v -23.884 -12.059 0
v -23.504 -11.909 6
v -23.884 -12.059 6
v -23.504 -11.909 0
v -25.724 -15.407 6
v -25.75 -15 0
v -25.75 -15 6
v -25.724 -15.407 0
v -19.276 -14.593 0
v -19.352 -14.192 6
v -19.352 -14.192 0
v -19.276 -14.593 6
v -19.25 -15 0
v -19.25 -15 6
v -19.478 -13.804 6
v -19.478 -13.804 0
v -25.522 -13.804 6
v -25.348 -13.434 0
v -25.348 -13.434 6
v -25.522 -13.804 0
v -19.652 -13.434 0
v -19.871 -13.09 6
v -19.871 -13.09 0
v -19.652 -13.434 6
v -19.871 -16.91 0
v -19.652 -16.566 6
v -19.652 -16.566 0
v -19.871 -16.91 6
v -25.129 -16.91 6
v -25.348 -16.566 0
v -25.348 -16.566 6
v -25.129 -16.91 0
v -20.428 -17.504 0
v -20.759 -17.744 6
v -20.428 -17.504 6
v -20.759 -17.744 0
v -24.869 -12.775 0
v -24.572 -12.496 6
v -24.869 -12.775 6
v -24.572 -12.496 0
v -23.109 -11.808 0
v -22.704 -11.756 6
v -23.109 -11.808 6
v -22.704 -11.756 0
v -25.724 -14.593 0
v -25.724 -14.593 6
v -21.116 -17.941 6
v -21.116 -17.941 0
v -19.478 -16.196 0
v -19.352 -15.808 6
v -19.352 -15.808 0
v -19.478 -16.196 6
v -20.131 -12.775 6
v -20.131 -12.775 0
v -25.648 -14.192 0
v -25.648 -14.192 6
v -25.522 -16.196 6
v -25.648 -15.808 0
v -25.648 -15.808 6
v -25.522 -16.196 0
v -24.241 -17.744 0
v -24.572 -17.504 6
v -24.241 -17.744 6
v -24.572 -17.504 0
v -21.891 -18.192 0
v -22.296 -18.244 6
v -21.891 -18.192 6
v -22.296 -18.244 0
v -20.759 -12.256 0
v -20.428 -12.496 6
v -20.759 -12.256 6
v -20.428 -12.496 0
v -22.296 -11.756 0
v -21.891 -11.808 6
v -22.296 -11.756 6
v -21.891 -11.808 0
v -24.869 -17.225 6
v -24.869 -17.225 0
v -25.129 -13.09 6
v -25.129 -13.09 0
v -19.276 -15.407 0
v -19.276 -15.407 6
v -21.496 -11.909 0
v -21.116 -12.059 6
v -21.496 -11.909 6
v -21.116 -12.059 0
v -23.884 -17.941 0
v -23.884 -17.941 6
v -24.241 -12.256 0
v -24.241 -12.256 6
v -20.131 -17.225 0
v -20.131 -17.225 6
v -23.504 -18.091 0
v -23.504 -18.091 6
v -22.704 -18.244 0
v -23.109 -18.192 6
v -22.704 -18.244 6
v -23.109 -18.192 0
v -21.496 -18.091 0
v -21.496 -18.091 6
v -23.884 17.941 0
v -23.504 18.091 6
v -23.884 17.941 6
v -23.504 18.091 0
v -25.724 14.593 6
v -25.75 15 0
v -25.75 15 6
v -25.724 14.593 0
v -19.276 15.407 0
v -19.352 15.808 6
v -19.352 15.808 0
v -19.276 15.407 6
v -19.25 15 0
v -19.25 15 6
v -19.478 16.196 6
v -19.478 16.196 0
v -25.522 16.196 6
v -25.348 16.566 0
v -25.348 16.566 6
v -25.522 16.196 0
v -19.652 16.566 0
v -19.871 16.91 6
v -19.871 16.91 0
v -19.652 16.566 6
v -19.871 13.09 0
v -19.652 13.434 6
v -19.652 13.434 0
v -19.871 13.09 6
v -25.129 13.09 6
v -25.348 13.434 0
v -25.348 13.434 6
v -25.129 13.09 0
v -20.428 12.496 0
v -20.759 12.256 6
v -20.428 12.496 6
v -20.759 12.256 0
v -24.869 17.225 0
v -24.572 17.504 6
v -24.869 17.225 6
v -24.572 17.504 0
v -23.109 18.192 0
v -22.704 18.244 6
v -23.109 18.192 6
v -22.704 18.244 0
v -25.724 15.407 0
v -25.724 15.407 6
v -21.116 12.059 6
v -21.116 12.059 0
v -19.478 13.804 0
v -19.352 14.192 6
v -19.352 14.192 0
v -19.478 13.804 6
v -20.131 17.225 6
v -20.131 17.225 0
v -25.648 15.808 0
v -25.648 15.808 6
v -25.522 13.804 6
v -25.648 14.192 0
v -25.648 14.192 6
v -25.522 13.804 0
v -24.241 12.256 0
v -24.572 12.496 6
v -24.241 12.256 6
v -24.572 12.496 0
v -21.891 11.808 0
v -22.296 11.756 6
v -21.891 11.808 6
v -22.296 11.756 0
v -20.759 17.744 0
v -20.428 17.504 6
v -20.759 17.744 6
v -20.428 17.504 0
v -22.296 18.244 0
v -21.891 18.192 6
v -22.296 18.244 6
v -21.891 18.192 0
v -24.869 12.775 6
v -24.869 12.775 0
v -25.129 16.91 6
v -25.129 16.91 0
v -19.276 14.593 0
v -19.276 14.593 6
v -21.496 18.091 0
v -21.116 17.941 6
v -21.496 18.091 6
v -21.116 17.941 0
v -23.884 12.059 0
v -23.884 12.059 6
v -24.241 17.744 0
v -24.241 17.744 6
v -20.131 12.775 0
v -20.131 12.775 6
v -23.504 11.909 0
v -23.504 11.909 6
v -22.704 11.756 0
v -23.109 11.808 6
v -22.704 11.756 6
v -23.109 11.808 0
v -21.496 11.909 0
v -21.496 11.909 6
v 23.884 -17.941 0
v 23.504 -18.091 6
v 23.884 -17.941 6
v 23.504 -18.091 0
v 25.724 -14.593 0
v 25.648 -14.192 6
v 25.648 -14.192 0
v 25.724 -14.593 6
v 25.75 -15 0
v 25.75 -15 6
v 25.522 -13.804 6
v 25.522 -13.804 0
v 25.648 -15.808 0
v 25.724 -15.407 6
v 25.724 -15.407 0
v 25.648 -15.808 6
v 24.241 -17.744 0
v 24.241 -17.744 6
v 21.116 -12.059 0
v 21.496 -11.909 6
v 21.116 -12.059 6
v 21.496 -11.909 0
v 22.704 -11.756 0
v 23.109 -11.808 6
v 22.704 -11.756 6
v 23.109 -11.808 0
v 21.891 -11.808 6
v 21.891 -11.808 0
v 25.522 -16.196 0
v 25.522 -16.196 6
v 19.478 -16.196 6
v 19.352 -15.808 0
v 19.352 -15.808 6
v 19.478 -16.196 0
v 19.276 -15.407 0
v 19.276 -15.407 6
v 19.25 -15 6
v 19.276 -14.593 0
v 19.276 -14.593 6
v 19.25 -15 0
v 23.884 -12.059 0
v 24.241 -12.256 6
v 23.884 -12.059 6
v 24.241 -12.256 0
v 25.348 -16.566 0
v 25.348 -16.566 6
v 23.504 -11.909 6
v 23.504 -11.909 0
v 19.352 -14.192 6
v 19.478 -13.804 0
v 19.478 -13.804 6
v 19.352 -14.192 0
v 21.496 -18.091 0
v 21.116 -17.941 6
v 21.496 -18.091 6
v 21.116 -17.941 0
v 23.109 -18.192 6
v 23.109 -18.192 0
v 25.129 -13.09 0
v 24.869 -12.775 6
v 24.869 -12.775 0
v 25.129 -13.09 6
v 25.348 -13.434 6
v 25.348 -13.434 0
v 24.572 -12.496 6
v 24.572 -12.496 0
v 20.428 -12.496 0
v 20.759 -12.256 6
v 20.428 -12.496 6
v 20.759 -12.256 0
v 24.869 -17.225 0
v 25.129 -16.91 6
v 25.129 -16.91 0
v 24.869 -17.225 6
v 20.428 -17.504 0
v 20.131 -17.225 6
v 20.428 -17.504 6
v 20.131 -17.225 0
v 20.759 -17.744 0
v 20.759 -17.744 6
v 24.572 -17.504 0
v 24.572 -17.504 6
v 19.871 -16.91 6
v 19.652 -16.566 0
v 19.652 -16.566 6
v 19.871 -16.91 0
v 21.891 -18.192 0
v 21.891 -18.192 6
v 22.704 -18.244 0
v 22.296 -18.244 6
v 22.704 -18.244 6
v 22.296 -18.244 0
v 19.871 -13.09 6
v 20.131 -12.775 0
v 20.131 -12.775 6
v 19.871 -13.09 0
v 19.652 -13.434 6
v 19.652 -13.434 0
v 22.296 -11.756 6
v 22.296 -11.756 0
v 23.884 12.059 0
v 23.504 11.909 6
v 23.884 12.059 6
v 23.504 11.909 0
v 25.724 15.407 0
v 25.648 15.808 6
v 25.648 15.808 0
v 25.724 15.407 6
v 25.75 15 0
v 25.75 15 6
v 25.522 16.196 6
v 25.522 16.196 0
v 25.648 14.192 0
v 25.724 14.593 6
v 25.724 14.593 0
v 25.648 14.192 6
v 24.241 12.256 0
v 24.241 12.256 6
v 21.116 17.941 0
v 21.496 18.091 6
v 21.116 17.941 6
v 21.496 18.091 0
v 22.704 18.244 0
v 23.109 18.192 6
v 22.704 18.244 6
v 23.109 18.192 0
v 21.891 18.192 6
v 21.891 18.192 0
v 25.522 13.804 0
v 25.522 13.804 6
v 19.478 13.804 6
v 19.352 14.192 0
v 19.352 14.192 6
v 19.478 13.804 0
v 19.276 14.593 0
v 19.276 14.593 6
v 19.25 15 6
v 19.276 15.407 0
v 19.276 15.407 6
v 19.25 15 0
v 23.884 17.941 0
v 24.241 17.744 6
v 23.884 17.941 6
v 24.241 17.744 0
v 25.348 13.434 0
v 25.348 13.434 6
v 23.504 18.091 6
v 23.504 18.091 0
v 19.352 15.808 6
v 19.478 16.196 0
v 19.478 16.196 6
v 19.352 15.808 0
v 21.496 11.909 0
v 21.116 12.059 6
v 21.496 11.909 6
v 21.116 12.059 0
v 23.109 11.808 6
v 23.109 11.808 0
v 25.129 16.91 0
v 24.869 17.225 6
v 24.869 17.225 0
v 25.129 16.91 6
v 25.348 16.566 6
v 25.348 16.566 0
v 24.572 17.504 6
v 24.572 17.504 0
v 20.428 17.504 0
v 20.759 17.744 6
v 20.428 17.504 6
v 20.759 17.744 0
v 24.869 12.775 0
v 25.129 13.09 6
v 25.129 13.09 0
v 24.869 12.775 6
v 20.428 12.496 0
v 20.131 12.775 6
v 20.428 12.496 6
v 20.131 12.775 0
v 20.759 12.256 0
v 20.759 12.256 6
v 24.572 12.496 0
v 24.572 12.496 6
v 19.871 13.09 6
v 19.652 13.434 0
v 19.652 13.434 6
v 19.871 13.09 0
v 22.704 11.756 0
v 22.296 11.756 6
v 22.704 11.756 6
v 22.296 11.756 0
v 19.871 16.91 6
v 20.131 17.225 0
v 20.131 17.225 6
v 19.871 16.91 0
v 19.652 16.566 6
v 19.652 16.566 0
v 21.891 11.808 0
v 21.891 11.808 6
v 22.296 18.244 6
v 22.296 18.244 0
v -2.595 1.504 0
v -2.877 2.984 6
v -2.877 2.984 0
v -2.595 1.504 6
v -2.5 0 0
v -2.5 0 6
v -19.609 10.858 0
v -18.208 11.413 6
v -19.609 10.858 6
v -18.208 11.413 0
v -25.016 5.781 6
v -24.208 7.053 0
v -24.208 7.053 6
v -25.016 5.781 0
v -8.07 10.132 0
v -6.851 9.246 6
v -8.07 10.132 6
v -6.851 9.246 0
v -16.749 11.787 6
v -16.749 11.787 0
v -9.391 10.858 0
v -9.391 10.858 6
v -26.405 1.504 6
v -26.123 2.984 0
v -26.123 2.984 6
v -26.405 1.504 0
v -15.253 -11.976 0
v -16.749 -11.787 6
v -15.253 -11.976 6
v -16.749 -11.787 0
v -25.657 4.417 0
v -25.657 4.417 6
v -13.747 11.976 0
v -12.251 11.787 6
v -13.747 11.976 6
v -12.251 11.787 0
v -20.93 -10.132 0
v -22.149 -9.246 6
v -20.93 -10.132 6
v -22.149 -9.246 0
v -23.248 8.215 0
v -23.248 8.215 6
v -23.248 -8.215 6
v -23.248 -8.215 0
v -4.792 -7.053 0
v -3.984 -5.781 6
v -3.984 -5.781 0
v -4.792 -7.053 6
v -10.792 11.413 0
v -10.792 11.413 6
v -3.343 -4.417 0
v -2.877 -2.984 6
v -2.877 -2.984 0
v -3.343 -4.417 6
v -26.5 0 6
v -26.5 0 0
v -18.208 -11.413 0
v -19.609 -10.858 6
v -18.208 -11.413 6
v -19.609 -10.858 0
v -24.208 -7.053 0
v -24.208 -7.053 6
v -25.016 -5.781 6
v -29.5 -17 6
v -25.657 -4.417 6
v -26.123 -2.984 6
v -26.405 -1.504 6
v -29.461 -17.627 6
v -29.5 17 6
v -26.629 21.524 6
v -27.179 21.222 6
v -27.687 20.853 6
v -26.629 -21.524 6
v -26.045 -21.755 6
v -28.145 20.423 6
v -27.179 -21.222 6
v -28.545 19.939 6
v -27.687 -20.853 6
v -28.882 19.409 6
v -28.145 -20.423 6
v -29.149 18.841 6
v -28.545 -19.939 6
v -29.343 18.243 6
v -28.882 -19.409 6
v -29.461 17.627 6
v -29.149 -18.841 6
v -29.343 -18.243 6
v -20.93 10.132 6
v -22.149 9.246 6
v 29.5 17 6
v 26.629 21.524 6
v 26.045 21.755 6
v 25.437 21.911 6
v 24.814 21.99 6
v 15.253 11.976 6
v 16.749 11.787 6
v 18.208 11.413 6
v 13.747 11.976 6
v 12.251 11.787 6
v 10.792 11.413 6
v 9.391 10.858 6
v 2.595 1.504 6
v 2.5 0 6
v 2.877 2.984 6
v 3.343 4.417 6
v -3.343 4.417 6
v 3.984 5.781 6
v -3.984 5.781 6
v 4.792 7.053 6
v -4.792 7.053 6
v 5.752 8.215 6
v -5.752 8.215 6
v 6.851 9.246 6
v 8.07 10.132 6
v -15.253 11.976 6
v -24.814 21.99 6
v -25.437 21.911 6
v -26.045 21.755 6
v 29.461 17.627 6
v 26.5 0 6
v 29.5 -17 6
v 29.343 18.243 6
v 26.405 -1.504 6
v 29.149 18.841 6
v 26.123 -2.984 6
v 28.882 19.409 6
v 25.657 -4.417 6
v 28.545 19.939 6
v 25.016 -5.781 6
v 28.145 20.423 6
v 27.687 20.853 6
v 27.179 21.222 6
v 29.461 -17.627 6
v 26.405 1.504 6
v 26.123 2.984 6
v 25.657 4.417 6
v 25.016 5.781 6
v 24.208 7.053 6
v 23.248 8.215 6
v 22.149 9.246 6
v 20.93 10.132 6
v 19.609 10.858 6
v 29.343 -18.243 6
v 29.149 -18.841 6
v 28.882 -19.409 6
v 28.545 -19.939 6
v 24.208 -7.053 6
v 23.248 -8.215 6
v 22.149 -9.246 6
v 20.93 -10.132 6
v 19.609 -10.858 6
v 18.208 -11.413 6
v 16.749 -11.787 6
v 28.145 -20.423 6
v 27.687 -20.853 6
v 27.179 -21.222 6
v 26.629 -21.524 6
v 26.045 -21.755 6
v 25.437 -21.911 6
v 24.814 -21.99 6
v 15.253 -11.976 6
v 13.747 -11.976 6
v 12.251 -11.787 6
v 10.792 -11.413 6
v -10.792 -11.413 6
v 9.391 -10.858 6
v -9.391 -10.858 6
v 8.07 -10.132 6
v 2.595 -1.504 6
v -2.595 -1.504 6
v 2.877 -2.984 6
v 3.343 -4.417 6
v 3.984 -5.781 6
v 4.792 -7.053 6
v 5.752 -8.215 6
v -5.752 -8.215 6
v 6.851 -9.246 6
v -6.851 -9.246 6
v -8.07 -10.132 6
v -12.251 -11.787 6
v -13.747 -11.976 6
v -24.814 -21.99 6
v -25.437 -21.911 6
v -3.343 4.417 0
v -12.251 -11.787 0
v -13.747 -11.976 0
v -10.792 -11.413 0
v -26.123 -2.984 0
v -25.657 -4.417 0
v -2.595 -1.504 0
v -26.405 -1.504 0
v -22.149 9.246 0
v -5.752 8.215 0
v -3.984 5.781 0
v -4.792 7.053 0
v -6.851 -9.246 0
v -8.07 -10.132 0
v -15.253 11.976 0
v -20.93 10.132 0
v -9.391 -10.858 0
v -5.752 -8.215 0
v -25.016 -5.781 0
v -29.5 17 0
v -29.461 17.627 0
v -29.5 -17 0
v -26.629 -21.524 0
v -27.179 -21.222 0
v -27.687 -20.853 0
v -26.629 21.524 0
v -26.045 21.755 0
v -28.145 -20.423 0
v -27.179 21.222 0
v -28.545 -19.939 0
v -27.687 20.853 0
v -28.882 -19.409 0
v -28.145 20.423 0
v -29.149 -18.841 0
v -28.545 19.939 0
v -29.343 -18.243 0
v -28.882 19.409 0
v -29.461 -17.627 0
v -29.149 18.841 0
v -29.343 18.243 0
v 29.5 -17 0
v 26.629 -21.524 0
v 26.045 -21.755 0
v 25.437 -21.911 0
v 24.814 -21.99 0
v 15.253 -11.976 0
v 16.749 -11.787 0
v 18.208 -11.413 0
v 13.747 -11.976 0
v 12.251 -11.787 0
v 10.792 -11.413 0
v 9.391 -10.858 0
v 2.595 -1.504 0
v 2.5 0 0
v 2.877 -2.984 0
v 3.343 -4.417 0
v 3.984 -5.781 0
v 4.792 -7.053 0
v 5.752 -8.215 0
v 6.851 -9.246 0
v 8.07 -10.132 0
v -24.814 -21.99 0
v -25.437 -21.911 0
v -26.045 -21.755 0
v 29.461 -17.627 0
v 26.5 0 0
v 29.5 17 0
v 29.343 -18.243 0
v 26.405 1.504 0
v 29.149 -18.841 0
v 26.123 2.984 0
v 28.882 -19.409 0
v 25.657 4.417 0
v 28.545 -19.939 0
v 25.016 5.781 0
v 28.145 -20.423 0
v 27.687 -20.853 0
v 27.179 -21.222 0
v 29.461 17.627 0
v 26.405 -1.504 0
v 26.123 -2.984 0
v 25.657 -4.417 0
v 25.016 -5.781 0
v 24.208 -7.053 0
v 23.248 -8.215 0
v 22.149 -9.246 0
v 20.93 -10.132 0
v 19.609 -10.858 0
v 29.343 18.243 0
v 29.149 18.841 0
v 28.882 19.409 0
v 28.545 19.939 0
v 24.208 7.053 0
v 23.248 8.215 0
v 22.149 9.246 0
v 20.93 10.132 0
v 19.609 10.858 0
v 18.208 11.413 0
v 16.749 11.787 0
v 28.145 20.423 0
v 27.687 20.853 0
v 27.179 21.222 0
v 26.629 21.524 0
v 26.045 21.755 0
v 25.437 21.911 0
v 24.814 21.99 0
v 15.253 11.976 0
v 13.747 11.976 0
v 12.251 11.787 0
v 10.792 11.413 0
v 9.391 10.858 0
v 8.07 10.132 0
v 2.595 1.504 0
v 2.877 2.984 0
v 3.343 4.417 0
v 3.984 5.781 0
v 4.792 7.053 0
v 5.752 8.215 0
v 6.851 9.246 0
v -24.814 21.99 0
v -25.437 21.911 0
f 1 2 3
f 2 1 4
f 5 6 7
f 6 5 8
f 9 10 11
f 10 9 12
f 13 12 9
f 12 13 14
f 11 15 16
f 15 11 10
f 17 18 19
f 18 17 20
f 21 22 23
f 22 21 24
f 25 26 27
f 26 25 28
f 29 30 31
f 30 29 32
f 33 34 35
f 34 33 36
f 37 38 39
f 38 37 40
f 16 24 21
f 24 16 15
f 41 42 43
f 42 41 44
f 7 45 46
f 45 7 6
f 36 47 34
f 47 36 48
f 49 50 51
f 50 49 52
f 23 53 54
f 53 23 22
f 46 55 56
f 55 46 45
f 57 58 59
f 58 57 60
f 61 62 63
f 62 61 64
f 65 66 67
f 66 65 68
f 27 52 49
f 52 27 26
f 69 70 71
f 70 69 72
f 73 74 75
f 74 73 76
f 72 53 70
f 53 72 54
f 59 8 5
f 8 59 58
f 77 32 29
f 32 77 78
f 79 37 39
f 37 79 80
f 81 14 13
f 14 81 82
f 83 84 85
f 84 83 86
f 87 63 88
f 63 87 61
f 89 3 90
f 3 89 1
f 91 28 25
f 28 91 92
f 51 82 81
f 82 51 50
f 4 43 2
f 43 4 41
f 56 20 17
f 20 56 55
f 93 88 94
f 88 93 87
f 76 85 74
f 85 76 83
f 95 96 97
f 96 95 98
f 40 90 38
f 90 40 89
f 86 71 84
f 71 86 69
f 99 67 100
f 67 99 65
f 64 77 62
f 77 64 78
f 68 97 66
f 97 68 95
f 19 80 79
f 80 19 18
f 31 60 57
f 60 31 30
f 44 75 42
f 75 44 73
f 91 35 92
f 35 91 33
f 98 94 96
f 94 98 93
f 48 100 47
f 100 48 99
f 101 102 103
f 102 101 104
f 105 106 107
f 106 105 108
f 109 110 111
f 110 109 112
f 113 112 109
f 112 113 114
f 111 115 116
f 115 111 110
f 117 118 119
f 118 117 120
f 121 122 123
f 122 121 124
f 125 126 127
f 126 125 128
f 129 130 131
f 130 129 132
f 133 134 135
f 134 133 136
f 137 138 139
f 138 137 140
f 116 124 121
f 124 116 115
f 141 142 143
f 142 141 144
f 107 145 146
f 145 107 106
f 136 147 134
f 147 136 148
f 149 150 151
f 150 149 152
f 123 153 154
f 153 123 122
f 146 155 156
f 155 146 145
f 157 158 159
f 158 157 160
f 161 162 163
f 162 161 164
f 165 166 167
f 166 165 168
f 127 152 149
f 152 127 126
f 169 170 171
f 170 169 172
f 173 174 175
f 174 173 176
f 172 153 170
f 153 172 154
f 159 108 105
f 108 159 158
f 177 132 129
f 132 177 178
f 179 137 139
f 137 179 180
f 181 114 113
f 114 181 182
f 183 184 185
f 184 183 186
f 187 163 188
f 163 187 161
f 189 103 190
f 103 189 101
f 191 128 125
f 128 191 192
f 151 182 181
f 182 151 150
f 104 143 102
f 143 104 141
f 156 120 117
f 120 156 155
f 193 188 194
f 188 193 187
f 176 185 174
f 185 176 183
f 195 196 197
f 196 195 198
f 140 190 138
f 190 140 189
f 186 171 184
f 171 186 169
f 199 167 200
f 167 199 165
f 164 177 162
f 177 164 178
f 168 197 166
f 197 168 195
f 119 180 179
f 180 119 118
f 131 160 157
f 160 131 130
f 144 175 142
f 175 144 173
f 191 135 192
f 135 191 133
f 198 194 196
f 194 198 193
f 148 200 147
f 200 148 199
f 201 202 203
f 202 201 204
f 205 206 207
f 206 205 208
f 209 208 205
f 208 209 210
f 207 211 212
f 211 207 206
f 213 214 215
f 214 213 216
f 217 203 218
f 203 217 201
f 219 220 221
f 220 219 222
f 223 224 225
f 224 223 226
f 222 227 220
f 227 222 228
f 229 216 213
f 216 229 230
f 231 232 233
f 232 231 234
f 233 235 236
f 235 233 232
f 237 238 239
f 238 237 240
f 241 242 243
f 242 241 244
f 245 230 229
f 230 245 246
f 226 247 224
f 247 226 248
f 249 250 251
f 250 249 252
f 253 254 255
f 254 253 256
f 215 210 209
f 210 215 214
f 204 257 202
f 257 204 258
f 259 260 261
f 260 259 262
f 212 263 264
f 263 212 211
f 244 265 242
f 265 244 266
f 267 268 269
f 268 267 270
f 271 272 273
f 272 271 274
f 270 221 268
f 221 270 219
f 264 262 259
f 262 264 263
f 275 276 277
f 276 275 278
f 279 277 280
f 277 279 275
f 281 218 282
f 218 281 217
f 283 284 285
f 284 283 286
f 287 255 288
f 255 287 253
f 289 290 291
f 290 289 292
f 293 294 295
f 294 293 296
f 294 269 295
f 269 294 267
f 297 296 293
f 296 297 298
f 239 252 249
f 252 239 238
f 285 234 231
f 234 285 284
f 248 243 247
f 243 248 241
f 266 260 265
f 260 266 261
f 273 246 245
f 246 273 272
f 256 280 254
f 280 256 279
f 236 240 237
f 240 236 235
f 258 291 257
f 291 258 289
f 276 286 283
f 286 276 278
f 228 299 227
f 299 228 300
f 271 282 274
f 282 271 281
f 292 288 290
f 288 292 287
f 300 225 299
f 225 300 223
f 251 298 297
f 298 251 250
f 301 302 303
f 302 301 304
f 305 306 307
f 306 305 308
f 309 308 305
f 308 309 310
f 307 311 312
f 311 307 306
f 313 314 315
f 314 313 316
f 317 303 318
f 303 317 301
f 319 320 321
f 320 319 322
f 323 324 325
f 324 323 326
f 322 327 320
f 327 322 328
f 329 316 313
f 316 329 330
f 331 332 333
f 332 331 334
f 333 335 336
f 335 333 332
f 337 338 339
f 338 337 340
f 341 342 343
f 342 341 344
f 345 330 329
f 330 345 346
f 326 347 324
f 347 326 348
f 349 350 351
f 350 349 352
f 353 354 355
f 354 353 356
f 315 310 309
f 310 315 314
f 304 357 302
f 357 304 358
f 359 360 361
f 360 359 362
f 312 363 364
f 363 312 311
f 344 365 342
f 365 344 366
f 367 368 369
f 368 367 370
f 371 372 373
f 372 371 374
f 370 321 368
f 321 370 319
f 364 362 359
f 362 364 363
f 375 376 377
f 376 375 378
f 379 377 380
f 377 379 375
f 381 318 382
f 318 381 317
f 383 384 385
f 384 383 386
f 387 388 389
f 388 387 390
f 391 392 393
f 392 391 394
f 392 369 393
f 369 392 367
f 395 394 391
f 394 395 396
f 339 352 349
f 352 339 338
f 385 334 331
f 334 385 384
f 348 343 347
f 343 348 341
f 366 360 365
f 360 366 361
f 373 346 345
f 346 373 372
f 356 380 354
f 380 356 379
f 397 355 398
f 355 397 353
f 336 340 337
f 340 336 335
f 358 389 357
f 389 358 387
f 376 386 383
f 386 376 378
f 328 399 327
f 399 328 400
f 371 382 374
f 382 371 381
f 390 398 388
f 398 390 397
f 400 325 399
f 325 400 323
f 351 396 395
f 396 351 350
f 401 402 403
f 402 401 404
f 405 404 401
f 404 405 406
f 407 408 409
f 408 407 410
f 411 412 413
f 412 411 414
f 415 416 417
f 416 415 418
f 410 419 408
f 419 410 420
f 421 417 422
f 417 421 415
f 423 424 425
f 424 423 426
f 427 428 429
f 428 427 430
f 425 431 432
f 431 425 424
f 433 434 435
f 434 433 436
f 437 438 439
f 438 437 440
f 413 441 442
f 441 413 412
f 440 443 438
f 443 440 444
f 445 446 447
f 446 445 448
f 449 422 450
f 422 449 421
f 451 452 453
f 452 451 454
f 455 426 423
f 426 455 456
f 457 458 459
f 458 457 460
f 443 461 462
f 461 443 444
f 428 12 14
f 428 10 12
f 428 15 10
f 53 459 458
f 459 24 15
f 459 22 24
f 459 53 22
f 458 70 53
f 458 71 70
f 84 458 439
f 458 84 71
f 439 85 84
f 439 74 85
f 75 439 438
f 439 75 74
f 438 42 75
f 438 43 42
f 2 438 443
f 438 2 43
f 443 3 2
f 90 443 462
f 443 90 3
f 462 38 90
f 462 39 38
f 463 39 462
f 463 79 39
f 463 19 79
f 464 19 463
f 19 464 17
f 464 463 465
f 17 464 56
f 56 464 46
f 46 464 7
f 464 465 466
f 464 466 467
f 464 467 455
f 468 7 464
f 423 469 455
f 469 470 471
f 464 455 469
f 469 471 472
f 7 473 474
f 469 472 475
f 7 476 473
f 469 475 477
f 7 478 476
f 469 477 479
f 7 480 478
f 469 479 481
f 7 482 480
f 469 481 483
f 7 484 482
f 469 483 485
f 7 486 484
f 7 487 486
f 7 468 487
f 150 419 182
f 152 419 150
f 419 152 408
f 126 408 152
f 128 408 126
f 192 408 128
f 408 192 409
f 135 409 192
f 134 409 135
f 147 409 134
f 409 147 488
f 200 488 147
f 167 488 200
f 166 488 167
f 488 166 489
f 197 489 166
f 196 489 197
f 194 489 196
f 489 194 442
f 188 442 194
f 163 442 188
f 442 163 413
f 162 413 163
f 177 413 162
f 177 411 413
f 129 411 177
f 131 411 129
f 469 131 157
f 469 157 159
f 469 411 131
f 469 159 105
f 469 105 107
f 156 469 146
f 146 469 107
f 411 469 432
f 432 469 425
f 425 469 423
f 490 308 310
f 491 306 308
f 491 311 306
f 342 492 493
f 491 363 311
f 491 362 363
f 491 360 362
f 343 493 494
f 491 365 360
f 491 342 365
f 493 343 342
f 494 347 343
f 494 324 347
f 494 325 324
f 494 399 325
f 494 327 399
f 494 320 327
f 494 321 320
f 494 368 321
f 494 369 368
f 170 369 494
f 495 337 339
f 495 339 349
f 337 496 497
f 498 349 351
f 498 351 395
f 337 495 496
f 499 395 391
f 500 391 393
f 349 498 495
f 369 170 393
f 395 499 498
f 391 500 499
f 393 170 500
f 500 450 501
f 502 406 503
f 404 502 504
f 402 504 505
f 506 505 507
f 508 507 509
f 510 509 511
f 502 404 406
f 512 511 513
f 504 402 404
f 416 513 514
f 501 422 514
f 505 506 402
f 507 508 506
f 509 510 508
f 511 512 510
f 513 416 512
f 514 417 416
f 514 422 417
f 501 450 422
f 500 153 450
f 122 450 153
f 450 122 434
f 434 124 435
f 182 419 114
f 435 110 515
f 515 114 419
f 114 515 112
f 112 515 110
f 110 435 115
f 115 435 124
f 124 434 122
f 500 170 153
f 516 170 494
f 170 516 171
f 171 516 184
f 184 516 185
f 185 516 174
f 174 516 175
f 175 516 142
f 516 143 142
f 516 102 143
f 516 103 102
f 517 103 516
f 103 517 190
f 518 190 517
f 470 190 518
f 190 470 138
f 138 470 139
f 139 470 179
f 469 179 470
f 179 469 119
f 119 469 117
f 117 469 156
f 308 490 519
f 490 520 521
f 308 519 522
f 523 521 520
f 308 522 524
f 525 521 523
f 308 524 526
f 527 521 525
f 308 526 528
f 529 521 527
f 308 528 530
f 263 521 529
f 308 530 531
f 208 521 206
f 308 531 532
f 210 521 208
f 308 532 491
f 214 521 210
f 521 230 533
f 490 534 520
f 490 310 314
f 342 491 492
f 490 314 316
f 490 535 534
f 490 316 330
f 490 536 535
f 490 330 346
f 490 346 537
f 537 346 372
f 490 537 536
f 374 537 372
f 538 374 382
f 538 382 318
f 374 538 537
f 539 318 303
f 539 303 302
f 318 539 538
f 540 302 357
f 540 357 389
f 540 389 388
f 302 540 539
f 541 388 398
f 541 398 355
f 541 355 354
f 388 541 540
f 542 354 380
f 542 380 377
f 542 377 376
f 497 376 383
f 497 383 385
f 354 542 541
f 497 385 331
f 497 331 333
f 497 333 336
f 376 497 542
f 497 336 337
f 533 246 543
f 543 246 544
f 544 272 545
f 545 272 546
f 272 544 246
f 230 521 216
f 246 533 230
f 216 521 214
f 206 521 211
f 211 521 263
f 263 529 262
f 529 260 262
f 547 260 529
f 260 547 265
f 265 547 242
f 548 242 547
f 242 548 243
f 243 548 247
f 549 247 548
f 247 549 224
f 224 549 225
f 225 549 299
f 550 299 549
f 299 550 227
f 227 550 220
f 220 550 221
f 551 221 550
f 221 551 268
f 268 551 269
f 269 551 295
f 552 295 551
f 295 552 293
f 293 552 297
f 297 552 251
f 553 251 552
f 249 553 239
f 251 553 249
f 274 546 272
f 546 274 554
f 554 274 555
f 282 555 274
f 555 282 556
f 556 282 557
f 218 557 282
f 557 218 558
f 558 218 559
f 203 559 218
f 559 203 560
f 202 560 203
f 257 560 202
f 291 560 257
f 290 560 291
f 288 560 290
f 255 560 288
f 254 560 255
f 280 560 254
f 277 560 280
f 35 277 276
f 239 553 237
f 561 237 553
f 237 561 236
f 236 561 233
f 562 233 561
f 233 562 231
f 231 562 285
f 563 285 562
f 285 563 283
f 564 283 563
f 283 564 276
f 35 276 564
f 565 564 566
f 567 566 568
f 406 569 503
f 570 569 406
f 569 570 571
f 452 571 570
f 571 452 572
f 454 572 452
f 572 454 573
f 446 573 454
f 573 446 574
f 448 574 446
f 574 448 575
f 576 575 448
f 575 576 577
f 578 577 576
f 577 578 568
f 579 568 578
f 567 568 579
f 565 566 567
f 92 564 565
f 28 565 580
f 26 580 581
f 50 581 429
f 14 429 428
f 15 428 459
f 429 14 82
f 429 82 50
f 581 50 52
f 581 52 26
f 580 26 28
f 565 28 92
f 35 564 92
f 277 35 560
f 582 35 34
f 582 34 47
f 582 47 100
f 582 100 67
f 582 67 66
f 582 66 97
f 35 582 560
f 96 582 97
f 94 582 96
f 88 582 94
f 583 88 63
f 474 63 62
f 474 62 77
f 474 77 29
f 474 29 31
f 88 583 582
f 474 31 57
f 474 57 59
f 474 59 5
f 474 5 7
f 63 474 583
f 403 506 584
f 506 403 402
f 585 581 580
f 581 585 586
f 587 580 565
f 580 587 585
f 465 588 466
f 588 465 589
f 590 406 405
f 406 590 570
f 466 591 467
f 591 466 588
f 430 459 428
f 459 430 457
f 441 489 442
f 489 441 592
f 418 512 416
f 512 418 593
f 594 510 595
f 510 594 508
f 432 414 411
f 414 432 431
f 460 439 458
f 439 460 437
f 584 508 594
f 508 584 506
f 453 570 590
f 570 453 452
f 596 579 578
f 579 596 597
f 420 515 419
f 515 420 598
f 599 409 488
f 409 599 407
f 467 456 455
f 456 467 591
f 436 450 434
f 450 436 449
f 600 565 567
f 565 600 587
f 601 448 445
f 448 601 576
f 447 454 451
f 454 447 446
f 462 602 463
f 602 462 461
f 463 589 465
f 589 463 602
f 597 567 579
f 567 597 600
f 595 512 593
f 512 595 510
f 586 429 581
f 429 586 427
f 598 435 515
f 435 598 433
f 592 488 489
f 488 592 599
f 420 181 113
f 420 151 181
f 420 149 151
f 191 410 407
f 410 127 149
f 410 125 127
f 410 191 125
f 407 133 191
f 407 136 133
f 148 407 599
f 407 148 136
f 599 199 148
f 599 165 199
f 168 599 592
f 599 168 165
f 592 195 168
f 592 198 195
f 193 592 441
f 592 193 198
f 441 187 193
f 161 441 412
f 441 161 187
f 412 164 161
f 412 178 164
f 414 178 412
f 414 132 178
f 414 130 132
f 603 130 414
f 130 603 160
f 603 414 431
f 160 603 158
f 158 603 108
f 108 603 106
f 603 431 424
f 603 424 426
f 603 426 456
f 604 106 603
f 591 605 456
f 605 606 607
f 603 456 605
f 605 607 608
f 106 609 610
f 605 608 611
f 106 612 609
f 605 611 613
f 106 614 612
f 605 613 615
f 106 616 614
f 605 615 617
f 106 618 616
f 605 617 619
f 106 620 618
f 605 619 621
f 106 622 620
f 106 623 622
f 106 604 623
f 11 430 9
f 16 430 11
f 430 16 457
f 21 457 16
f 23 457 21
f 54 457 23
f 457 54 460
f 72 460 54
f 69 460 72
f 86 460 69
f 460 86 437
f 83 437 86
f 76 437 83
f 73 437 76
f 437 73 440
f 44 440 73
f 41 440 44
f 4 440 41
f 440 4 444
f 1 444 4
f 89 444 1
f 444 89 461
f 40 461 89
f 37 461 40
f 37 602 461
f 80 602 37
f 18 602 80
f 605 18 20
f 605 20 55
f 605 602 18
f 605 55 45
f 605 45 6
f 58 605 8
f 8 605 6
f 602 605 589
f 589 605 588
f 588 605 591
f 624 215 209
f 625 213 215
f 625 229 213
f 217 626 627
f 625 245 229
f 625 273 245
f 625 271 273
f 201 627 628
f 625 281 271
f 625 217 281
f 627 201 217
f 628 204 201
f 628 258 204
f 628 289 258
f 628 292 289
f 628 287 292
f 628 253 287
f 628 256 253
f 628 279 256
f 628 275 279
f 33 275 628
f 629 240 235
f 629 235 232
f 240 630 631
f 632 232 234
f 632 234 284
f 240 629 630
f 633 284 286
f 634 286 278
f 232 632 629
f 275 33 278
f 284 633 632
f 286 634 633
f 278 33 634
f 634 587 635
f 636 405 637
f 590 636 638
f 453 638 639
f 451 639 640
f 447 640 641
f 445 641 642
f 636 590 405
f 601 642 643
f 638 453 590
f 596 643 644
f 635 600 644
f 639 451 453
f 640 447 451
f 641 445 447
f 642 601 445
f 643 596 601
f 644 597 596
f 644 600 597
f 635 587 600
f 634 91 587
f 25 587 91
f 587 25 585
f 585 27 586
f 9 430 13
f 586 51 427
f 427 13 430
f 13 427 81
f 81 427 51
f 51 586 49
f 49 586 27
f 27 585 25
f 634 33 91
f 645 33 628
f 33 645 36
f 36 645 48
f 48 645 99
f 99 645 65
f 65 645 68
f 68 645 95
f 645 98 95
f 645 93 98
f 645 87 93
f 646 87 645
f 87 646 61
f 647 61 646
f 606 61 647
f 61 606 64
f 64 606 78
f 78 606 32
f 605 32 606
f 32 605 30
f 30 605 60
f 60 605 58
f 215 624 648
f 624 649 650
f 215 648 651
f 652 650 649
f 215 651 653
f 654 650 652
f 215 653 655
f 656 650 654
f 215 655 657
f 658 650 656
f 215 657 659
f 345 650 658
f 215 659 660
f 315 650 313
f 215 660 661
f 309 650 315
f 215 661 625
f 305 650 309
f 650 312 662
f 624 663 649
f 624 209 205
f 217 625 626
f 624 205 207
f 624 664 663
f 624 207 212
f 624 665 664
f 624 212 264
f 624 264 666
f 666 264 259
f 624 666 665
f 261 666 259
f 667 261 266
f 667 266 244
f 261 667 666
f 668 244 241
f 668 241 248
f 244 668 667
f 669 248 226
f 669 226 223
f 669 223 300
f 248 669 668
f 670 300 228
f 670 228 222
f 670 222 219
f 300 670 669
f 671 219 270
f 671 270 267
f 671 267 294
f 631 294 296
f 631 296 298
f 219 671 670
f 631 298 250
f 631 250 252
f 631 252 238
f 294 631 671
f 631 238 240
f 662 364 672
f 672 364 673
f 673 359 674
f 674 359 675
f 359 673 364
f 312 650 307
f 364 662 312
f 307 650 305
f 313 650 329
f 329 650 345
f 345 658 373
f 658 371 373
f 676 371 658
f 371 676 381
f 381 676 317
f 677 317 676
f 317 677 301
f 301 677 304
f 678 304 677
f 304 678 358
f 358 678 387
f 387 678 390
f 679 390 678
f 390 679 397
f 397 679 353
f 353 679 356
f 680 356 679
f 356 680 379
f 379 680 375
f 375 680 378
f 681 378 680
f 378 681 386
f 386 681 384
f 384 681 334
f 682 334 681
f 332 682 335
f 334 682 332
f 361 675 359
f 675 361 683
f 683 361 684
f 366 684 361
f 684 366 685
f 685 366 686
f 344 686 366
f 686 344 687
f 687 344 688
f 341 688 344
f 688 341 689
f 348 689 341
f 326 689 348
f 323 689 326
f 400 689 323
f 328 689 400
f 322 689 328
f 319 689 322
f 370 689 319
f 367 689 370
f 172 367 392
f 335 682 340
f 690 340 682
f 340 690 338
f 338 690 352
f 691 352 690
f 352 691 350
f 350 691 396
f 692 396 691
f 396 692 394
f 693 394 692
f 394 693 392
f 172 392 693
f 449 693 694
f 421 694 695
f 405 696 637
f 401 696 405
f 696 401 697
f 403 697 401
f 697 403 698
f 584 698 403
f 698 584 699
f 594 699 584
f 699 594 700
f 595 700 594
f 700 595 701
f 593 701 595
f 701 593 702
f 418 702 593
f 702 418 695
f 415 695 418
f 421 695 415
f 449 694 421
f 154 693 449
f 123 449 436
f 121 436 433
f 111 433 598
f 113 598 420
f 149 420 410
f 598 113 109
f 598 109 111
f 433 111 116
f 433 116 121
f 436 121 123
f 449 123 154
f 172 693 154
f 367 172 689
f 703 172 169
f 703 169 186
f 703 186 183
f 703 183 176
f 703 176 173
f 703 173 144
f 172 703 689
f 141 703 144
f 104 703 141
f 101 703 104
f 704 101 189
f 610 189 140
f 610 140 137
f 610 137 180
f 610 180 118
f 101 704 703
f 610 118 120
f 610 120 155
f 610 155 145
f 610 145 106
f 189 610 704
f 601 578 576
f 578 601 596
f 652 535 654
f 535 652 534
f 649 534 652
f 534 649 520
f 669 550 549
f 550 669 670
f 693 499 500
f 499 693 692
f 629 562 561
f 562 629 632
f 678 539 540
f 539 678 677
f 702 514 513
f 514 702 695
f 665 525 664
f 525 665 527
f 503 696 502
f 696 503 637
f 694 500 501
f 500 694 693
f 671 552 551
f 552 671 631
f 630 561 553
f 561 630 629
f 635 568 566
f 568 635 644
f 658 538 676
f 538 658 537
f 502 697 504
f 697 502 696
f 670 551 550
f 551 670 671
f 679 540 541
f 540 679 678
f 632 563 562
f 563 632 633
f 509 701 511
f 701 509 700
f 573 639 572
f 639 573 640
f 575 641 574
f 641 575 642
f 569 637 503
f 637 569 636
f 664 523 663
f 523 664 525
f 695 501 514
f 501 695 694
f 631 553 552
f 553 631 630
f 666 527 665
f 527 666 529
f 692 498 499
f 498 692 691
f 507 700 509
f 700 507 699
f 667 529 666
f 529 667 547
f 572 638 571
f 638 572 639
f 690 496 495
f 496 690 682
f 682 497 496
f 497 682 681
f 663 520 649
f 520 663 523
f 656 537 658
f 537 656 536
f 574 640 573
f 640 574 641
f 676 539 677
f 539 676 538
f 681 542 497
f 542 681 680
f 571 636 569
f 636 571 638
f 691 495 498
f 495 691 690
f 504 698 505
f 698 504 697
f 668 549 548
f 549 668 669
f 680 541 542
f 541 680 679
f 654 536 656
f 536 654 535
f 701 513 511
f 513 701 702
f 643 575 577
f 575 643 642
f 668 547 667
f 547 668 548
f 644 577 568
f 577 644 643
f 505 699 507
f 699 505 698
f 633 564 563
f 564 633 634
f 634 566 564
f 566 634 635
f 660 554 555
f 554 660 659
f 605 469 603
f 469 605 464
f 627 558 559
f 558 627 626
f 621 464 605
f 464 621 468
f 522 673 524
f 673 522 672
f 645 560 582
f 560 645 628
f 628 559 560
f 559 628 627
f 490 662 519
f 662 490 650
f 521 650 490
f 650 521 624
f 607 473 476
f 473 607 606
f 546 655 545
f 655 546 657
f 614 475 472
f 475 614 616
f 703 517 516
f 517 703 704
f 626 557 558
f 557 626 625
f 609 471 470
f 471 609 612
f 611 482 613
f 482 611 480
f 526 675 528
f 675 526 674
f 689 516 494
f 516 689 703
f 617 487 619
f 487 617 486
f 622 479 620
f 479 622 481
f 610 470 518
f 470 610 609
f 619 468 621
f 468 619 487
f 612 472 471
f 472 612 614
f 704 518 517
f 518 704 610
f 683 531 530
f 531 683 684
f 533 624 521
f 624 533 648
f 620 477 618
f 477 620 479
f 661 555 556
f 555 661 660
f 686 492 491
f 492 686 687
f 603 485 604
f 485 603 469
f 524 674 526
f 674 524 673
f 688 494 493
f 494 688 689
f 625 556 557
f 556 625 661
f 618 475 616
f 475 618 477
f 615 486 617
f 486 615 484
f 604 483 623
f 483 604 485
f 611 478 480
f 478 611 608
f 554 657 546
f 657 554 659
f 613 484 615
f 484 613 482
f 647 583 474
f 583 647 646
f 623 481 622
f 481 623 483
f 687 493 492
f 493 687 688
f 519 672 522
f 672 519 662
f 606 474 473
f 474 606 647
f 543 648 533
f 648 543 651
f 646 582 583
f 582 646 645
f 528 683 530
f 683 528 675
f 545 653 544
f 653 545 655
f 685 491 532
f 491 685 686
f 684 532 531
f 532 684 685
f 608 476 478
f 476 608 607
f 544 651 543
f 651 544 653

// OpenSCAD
$fn = 50;


difference() {
	union() {
		hull() {
			translate(v = [-24.5000000000, 17.0000000000, 0]) {
				cylinder(h = 6, r = 5);
			}
			translate(v = [24.5000000000, 17.0000000000, 0]) {
				cylinder(h = 6, r = 5);
			}
			translate(v = [-24.5000000000, -17.0000000000, 0]) {
				cylinder(h = 6, r = 5);
			}
			translate(v = [24.5000000000, -17.0000000000, 0]) {
				cylinder(h = 6, r = 5);
			}
		}
	}
	union() {
		#translate(v = [-22.5000000000, -15.0000000000, -100.0000000000]) {
			cylinder(h = 200, r = 3.2500000000);
		}
		#translate(v = [-22.5000000000, 15.0000000000, -100.0000000000]) {
			cylinder(h = 200, r = 3.2500000000);
		}
		#translate(v = [22.5000000000, -15.0000000000, -100.0000000000]) {
			cylinder(h = 200, r = 3.2500000000);
		}
		#translate(v = [22.5000000000, 15.0000000000, -100.0000000000]) {
			cylinder(h = 200, r = 3.2500000000);
		}
		#translate(v = [-14.5000000000, 0, 0]) {
			cylinder(h = 6, r = 12.0000000000);
		}
		#translate(v = [14.5000000000, 0, 0]) {
			cylinder(h = 6, r = 12.0000000000);
		}
	}
}
